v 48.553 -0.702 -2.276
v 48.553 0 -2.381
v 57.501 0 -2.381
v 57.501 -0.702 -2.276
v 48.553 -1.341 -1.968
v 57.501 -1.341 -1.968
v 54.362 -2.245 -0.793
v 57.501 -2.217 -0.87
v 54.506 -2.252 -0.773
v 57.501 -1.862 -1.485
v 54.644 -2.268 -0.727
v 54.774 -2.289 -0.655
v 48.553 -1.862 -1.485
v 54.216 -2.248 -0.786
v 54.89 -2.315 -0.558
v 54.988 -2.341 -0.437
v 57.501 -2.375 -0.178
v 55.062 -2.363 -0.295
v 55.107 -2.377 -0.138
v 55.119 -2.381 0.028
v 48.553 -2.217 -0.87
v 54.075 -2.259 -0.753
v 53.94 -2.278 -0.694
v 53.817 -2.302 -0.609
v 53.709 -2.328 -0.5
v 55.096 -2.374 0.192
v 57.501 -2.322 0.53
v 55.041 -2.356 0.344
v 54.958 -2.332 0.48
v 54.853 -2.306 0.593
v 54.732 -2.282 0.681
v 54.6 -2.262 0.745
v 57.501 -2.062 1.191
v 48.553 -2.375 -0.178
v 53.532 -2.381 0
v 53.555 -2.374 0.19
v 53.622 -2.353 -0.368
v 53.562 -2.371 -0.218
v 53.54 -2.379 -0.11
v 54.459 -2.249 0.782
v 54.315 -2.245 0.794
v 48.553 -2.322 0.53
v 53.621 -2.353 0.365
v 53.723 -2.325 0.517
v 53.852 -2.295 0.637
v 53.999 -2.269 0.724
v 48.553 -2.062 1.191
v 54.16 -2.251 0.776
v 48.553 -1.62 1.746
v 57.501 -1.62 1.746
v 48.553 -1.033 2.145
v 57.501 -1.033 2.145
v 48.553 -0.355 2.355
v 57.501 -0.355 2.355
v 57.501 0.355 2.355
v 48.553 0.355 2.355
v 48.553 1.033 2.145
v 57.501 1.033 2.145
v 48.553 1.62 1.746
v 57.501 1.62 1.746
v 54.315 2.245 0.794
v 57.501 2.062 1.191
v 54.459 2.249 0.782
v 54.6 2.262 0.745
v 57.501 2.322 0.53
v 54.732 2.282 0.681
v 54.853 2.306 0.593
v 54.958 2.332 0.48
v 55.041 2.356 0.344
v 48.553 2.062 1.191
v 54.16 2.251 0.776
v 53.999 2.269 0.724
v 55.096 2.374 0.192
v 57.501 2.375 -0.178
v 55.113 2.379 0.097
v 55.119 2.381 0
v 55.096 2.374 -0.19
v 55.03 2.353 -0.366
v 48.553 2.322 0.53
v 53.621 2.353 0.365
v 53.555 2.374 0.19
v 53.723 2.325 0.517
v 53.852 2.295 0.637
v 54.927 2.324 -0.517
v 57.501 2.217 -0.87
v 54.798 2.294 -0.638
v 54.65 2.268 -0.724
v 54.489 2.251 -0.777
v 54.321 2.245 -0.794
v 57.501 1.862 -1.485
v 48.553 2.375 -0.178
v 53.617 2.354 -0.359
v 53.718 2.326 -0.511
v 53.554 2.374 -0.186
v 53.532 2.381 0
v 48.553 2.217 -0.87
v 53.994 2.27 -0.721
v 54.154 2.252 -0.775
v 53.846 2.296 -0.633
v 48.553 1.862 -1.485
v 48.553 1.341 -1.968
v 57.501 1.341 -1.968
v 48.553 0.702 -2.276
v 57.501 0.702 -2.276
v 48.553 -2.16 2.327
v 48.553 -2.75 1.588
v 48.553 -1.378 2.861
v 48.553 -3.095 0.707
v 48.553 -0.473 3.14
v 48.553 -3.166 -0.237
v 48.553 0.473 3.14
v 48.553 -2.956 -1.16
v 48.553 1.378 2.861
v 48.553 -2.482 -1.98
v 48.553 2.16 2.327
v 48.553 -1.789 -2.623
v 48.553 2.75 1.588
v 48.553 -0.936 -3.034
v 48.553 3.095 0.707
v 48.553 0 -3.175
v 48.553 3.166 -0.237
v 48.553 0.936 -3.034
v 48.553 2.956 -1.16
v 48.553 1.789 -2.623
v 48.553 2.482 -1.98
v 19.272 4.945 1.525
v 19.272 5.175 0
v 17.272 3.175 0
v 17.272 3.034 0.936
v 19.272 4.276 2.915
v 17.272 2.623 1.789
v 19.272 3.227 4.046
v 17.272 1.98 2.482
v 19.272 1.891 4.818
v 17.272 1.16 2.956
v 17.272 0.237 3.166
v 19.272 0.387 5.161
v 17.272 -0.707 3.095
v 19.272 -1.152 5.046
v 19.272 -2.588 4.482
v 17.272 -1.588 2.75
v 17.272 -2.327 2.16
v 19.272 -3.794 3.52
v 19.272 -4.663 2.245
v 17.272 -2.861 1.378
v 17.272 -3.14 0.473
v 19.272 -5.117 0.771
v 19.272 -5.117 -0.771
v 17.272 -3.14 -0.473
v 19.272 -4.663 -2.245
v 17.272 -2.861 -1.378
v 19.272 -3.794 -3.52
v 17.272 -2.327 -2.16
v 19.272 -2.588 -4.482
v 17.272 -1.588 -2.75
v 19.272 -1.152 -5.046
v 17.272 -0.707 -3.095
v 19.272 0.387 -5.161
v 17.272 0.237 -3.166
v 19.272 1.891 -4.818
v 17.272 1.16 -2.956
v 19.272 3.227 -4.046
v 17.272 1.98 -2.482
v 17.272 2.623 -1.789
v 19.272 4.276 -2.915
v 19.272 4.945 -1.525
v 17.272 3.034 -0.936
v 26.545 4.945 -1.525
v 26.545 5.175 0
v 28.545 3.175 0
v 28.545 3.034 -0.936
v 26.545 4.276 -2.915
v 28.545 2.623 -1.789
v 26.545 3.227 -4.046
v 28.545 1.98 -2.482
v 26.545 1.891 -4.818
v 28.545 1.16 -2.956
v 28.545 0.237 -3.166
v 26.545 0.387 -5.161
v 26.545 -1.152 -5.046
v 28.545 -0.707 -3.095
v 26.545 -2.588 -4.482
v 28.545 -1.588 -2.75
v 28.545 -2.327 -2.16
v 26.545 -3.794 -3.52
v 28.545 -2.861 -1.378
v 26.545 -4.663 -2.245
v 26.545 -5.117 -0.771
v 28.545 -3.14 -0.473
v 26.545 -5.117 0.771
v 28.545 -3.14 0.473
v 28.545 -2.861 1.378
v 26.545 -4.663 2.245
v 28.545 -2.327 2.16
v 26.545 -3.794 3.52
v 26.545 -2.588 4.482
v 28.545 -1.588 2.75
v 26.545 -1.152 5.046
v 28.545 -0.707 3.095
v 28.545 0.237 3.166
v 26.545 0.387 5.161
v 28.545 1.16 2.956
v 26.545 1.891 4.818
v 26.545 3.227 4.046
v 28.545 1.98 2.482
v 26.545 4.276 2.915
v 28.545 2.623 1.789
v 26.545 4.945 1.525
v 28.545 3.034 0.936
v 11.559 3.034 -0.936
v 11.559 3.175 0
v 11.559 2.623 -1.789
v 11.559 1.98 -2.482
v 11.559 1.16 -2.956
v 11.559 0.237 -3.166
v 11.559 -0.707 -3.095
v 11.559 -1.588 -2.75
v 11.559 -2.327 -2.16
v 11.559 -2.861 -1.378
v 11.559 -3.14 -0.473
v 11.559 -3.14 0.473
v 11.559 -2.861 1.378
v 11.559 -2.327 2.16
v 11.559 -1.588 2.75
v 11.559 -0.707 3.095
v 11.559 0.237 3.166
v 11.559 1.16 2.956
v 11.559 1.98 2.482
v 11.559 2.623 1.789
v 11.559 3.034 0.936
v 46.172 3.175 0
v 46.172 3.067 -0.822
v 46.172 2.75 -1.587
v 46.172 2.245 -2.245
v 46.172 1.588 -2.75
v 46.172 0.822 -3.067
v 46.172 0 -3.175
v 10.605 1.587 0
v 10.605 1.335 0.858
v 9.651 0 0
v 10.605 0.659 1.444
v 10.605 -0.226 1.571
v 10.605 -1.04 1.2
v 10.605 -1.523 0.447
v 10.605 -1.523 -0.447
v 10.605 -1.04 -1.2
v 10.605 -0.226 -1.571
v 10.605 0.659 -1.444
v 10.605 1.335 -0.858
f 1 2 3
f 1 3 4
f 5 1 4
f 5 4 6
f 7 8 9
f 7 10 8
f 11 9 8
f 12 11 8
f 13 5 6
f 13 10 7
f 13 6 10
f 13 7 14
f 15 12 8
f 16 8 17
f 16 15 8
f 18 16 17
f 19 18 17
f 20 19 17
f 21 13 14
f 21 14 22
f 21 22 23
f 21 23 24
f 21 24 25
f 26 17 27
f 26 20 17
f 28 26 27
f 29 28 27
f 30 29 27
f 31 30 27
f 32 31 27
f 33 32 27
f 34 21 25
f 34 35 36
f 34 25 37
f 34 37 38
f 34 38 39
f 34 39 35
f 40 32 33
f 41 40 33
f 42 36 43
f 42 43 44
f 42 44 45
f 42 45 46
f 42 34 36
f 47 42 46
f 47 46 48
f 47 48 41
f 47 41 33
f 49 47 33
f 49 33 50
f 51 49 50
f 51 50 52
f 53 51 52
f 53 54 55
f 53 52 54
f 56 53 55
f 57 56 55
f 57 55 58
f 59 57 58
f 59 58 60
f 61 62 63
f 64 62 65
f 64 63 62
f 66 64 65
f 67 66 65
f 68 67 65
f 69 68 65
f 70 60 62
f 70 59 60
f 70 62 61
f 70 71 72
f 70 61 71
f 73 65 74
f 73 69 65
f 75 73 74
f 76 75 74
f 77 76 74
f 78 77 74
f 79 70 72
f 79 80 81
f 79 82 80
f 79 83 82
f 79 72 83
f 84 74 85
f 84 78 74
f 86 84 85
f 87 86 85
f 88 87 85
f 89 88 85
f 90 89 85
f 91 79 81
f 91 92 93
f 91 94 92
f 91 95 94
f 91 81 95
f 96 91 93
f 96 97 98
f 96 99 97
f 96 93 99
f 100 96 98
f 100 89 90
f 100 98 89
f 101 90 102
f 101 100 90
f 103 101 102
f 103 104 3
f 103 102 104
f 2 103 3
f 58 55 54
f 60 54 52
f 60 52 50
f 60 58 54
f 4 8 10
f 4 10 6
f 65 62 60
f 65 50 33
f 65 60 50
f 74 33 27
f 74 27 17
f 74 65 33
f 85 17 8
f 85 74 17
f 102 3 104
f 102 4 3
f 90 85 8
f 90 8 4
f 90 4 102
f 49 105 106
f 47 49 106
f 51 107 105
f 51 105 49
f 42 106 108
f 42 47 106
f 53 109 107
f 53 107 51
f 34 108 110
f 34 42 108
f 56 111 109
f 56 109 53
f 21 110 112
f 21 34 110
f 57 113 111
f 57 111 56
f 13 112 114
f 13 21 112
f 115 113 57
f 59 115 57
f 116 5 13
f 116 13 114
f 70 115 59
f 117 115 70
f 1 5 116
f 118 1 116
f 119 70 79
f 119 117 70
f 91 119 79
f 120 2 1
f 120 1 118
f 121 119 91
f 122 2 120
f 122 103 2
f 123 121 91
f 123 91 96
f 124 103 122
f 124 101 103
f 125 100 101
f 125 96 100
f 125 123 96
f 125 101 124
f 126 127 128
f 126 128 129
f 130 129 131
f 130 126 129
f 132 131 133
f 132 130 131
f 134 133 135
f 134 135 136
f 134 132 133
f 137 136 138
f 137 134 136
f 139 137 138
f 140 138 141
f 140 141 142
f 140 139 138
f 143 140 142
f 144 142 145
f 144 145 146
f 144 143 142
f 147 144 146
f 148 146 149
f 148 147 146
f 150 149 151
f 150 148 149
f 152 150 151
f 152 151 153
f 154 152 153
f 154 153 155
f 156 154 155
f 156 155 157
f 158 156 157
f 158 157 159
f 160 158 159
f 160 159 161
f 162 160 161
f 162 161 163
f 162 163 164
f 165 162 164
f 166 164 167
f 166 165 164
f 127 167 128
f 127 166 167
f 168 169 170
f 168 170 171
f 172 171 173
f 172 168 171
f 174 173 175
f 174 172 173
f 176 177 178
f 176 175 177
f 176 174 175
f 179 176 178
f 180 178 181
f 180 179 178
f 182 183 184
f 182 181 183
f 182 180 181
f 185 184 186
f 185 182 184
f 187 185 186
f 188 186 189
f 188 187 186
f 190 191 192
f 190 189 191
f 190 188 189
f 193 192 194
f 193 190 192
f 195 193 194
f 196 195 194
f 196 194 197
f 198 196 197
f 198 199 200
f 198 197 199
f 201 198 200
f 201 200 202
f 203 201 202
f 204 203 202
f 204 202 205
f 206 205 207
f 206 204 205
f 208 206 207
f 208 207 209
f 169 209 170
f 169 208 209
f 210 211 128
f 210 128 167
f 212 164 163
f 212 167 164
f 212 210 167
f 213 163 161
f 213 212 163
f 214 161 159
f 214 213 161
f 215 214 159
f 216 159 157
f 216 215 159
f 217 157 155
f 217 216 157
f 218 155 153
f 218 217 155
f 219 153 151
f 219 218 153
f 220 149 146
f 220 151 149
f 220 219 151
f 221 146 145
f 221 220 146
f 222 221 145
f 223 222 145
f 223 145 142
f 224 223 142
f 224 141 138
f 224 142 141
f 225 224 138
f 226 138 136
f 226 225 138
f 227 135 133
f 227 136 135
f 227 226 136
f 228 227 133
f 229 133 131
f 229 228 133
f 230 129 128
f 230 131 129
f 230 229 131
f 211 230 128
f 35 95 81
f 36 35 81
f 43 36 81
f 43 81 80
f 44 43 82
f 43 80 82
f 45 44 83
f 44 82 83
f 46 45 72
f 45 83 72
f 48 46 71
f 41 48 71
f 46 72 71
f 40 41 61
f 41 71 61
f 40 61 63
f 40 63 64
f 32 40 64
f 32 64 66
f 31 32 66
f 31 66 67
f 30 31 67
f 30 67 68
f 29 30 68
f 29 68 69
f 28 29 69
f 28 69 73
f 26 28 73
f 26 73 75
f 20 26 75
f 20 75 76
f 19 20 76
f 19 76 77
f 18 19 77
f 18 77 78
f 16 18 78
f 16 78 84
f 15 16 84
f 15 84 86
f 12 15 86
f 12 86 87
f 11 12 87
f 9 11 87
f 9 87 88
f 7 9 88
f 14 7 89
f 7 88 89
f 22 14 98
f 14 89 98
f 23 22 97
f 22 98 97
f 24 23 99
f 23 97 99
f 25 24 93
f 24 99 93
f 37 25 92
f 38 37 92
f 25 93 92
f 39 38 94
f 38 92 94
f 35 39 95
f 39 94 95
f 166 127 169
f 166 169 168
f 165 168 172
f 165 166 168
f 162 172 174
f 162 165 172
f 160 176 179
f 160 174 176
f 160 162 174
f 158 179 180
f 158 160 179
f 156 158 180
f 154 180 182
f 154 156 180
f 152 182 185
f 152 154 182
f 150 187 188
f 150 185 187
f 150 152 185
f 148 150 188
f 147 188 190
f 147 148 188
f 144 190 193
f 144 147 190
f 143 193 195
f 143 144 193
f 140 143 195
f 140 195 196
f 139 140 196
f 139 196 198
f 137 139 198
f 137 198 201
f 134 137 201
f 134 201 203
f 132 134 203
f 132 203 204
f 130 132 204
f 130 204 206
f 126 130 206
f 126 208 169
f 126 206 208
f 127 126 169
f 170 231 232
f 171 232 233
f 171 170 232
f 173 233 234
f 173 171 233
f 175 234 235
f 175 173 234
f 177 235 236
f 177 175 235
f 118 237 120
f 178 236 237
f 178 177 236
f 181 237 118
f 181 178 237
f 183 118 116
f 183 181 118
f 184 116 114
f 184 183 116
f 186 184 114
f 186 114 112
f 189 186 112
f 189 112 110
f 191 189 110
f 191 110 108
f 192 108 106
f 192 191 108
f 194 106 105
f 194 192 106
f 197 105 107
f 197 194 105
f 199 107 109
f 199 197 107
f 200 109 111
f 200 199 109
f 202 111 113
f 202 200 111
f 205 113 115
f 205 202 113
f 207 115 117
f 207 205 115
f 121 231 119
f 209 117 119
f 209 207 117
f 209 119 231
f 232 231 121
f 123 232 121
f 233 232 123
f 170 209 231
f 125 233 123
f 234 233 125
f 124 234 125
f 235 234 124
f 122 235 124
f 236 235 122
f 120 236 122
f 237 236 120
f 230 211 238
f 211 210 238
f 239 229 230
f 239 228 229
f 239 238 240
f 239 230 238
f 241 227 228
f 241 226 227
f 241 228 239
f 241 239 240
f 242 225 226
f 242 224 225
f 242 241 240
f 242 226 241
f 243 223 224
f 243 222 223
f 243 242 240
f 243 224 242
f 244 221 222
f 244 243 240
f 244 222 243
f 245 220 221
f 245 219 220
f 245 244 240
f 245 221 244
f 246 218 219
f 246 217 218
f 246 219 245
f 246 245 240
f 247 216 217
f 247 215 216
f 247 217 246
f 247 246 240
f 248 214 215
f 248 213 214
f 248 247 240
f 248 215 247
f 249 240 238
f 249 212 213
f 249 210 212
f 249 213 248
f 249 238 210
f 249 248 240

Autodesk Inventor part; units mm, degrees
ref_plane "YZ Plane" through (0, 0, 0) normal (1, 0, 0) x (0, 1, 0)
ref_plane "XY Plane" through (0, 0, 0) normal (0, 0, 1) x (1, 0, 0)
sketch "Sketch1" plane through (0, 0, 0) normal (0, 0, 1) x (1, 0, 0)
  line L0 (51.1505, 3.175) -> (28.5454, 3.175)
  line L1 (19.2722, 5.1753) -> (17.272, 3.175)
  line L2 (26.5452, 5.1753) -> (28.5454, 3.175)
  line L3 (9.6514, 0) -> (11.5592, 3.175)
  line L4 (17.272, 3.175) -> (11.5592, 3.175)
  line L5 (26.5452, 5.1753) -> (19.2722, 5.1753)
  line L6 (9.6514, 0) -> (51.1505, 0)
  line L7 (51.1505, 3.175) -> (51.1505, 0)
  point P0 (0, 0)
  dimension "d3" = 135
  dimension "d4" = 7.2729
  dimension "d5" = 5.7128
  dimension "d8" = 59
  dimension "d9" = 135
  dimension "d10" = 41.4991
  dimension "d11" = 3.175
  dimension "d12" = 5.1753
  dimension "d13" = 3.175
  dimension "d14" = 9.6514
revolve "Revolution1" add sketch "Sketch1" angle 360 about axis through (9.6514, 0, 0) along (1, 0, 0)
sketch "Sketch2" plane through (51.1505, 0, 0) normal (1, 0, 0) x (0, 0, -1)
  circle A0 centre (0, 0) radius 3.175 projected
extrude "Extrusion1" cut sketch "Sketch2" against normal blind 4.9784
sketch "Sketch5" plane through (46.1721, 0, 0) normal (1, 0, 0) x (0, 0, -1)
  circle A0 centre (0, 0) radius 3.175 projected
extrude "Extrusion4" add sketch "Sketch5" along normal blind 2.3813
sketch "Sketch6" plane through (48.5534, 0, 0) normal (1, 0, 0) x (0, 0, -1)
  circle A0 centre (0, 0) radius 3.175 projected
  circle A1 centre (0, 0) radius 2.3813
  dimension "d30" = 4.7625
extrude "Extrusion5" add sketch "Sketch6" along normal blind 8.9472 contours A1
ref_plane "Work Plane1" through (48.5534, 2.3813, 0) normal (0, 1, 0) x (-1, 0, 0)
sketch "Sketch7" plane through (48.5534, 2.3813, 0) normal (0, 1, 0) x (-1, 0, 0)
  line L0 (-8.9471, 2.3813) -> (-8.9471, -2.3813) projected
  line L1 (0, -2.3813) -> (0, 2.3813) projected
  line L2 (-8.9471, 0) -> (0, 0) construction
  circle A0 centre (-5.7721, 0) radius 0.7937
  point P0 (48.5534, 0)
  dimension "d34" = 1.5875
  dimension "d36" = 5.7721
extrude "Extrusion6" cut sketch "Sketch7" against normal through all
properties part number "Ball Shifting Shaft" material "Steel"
